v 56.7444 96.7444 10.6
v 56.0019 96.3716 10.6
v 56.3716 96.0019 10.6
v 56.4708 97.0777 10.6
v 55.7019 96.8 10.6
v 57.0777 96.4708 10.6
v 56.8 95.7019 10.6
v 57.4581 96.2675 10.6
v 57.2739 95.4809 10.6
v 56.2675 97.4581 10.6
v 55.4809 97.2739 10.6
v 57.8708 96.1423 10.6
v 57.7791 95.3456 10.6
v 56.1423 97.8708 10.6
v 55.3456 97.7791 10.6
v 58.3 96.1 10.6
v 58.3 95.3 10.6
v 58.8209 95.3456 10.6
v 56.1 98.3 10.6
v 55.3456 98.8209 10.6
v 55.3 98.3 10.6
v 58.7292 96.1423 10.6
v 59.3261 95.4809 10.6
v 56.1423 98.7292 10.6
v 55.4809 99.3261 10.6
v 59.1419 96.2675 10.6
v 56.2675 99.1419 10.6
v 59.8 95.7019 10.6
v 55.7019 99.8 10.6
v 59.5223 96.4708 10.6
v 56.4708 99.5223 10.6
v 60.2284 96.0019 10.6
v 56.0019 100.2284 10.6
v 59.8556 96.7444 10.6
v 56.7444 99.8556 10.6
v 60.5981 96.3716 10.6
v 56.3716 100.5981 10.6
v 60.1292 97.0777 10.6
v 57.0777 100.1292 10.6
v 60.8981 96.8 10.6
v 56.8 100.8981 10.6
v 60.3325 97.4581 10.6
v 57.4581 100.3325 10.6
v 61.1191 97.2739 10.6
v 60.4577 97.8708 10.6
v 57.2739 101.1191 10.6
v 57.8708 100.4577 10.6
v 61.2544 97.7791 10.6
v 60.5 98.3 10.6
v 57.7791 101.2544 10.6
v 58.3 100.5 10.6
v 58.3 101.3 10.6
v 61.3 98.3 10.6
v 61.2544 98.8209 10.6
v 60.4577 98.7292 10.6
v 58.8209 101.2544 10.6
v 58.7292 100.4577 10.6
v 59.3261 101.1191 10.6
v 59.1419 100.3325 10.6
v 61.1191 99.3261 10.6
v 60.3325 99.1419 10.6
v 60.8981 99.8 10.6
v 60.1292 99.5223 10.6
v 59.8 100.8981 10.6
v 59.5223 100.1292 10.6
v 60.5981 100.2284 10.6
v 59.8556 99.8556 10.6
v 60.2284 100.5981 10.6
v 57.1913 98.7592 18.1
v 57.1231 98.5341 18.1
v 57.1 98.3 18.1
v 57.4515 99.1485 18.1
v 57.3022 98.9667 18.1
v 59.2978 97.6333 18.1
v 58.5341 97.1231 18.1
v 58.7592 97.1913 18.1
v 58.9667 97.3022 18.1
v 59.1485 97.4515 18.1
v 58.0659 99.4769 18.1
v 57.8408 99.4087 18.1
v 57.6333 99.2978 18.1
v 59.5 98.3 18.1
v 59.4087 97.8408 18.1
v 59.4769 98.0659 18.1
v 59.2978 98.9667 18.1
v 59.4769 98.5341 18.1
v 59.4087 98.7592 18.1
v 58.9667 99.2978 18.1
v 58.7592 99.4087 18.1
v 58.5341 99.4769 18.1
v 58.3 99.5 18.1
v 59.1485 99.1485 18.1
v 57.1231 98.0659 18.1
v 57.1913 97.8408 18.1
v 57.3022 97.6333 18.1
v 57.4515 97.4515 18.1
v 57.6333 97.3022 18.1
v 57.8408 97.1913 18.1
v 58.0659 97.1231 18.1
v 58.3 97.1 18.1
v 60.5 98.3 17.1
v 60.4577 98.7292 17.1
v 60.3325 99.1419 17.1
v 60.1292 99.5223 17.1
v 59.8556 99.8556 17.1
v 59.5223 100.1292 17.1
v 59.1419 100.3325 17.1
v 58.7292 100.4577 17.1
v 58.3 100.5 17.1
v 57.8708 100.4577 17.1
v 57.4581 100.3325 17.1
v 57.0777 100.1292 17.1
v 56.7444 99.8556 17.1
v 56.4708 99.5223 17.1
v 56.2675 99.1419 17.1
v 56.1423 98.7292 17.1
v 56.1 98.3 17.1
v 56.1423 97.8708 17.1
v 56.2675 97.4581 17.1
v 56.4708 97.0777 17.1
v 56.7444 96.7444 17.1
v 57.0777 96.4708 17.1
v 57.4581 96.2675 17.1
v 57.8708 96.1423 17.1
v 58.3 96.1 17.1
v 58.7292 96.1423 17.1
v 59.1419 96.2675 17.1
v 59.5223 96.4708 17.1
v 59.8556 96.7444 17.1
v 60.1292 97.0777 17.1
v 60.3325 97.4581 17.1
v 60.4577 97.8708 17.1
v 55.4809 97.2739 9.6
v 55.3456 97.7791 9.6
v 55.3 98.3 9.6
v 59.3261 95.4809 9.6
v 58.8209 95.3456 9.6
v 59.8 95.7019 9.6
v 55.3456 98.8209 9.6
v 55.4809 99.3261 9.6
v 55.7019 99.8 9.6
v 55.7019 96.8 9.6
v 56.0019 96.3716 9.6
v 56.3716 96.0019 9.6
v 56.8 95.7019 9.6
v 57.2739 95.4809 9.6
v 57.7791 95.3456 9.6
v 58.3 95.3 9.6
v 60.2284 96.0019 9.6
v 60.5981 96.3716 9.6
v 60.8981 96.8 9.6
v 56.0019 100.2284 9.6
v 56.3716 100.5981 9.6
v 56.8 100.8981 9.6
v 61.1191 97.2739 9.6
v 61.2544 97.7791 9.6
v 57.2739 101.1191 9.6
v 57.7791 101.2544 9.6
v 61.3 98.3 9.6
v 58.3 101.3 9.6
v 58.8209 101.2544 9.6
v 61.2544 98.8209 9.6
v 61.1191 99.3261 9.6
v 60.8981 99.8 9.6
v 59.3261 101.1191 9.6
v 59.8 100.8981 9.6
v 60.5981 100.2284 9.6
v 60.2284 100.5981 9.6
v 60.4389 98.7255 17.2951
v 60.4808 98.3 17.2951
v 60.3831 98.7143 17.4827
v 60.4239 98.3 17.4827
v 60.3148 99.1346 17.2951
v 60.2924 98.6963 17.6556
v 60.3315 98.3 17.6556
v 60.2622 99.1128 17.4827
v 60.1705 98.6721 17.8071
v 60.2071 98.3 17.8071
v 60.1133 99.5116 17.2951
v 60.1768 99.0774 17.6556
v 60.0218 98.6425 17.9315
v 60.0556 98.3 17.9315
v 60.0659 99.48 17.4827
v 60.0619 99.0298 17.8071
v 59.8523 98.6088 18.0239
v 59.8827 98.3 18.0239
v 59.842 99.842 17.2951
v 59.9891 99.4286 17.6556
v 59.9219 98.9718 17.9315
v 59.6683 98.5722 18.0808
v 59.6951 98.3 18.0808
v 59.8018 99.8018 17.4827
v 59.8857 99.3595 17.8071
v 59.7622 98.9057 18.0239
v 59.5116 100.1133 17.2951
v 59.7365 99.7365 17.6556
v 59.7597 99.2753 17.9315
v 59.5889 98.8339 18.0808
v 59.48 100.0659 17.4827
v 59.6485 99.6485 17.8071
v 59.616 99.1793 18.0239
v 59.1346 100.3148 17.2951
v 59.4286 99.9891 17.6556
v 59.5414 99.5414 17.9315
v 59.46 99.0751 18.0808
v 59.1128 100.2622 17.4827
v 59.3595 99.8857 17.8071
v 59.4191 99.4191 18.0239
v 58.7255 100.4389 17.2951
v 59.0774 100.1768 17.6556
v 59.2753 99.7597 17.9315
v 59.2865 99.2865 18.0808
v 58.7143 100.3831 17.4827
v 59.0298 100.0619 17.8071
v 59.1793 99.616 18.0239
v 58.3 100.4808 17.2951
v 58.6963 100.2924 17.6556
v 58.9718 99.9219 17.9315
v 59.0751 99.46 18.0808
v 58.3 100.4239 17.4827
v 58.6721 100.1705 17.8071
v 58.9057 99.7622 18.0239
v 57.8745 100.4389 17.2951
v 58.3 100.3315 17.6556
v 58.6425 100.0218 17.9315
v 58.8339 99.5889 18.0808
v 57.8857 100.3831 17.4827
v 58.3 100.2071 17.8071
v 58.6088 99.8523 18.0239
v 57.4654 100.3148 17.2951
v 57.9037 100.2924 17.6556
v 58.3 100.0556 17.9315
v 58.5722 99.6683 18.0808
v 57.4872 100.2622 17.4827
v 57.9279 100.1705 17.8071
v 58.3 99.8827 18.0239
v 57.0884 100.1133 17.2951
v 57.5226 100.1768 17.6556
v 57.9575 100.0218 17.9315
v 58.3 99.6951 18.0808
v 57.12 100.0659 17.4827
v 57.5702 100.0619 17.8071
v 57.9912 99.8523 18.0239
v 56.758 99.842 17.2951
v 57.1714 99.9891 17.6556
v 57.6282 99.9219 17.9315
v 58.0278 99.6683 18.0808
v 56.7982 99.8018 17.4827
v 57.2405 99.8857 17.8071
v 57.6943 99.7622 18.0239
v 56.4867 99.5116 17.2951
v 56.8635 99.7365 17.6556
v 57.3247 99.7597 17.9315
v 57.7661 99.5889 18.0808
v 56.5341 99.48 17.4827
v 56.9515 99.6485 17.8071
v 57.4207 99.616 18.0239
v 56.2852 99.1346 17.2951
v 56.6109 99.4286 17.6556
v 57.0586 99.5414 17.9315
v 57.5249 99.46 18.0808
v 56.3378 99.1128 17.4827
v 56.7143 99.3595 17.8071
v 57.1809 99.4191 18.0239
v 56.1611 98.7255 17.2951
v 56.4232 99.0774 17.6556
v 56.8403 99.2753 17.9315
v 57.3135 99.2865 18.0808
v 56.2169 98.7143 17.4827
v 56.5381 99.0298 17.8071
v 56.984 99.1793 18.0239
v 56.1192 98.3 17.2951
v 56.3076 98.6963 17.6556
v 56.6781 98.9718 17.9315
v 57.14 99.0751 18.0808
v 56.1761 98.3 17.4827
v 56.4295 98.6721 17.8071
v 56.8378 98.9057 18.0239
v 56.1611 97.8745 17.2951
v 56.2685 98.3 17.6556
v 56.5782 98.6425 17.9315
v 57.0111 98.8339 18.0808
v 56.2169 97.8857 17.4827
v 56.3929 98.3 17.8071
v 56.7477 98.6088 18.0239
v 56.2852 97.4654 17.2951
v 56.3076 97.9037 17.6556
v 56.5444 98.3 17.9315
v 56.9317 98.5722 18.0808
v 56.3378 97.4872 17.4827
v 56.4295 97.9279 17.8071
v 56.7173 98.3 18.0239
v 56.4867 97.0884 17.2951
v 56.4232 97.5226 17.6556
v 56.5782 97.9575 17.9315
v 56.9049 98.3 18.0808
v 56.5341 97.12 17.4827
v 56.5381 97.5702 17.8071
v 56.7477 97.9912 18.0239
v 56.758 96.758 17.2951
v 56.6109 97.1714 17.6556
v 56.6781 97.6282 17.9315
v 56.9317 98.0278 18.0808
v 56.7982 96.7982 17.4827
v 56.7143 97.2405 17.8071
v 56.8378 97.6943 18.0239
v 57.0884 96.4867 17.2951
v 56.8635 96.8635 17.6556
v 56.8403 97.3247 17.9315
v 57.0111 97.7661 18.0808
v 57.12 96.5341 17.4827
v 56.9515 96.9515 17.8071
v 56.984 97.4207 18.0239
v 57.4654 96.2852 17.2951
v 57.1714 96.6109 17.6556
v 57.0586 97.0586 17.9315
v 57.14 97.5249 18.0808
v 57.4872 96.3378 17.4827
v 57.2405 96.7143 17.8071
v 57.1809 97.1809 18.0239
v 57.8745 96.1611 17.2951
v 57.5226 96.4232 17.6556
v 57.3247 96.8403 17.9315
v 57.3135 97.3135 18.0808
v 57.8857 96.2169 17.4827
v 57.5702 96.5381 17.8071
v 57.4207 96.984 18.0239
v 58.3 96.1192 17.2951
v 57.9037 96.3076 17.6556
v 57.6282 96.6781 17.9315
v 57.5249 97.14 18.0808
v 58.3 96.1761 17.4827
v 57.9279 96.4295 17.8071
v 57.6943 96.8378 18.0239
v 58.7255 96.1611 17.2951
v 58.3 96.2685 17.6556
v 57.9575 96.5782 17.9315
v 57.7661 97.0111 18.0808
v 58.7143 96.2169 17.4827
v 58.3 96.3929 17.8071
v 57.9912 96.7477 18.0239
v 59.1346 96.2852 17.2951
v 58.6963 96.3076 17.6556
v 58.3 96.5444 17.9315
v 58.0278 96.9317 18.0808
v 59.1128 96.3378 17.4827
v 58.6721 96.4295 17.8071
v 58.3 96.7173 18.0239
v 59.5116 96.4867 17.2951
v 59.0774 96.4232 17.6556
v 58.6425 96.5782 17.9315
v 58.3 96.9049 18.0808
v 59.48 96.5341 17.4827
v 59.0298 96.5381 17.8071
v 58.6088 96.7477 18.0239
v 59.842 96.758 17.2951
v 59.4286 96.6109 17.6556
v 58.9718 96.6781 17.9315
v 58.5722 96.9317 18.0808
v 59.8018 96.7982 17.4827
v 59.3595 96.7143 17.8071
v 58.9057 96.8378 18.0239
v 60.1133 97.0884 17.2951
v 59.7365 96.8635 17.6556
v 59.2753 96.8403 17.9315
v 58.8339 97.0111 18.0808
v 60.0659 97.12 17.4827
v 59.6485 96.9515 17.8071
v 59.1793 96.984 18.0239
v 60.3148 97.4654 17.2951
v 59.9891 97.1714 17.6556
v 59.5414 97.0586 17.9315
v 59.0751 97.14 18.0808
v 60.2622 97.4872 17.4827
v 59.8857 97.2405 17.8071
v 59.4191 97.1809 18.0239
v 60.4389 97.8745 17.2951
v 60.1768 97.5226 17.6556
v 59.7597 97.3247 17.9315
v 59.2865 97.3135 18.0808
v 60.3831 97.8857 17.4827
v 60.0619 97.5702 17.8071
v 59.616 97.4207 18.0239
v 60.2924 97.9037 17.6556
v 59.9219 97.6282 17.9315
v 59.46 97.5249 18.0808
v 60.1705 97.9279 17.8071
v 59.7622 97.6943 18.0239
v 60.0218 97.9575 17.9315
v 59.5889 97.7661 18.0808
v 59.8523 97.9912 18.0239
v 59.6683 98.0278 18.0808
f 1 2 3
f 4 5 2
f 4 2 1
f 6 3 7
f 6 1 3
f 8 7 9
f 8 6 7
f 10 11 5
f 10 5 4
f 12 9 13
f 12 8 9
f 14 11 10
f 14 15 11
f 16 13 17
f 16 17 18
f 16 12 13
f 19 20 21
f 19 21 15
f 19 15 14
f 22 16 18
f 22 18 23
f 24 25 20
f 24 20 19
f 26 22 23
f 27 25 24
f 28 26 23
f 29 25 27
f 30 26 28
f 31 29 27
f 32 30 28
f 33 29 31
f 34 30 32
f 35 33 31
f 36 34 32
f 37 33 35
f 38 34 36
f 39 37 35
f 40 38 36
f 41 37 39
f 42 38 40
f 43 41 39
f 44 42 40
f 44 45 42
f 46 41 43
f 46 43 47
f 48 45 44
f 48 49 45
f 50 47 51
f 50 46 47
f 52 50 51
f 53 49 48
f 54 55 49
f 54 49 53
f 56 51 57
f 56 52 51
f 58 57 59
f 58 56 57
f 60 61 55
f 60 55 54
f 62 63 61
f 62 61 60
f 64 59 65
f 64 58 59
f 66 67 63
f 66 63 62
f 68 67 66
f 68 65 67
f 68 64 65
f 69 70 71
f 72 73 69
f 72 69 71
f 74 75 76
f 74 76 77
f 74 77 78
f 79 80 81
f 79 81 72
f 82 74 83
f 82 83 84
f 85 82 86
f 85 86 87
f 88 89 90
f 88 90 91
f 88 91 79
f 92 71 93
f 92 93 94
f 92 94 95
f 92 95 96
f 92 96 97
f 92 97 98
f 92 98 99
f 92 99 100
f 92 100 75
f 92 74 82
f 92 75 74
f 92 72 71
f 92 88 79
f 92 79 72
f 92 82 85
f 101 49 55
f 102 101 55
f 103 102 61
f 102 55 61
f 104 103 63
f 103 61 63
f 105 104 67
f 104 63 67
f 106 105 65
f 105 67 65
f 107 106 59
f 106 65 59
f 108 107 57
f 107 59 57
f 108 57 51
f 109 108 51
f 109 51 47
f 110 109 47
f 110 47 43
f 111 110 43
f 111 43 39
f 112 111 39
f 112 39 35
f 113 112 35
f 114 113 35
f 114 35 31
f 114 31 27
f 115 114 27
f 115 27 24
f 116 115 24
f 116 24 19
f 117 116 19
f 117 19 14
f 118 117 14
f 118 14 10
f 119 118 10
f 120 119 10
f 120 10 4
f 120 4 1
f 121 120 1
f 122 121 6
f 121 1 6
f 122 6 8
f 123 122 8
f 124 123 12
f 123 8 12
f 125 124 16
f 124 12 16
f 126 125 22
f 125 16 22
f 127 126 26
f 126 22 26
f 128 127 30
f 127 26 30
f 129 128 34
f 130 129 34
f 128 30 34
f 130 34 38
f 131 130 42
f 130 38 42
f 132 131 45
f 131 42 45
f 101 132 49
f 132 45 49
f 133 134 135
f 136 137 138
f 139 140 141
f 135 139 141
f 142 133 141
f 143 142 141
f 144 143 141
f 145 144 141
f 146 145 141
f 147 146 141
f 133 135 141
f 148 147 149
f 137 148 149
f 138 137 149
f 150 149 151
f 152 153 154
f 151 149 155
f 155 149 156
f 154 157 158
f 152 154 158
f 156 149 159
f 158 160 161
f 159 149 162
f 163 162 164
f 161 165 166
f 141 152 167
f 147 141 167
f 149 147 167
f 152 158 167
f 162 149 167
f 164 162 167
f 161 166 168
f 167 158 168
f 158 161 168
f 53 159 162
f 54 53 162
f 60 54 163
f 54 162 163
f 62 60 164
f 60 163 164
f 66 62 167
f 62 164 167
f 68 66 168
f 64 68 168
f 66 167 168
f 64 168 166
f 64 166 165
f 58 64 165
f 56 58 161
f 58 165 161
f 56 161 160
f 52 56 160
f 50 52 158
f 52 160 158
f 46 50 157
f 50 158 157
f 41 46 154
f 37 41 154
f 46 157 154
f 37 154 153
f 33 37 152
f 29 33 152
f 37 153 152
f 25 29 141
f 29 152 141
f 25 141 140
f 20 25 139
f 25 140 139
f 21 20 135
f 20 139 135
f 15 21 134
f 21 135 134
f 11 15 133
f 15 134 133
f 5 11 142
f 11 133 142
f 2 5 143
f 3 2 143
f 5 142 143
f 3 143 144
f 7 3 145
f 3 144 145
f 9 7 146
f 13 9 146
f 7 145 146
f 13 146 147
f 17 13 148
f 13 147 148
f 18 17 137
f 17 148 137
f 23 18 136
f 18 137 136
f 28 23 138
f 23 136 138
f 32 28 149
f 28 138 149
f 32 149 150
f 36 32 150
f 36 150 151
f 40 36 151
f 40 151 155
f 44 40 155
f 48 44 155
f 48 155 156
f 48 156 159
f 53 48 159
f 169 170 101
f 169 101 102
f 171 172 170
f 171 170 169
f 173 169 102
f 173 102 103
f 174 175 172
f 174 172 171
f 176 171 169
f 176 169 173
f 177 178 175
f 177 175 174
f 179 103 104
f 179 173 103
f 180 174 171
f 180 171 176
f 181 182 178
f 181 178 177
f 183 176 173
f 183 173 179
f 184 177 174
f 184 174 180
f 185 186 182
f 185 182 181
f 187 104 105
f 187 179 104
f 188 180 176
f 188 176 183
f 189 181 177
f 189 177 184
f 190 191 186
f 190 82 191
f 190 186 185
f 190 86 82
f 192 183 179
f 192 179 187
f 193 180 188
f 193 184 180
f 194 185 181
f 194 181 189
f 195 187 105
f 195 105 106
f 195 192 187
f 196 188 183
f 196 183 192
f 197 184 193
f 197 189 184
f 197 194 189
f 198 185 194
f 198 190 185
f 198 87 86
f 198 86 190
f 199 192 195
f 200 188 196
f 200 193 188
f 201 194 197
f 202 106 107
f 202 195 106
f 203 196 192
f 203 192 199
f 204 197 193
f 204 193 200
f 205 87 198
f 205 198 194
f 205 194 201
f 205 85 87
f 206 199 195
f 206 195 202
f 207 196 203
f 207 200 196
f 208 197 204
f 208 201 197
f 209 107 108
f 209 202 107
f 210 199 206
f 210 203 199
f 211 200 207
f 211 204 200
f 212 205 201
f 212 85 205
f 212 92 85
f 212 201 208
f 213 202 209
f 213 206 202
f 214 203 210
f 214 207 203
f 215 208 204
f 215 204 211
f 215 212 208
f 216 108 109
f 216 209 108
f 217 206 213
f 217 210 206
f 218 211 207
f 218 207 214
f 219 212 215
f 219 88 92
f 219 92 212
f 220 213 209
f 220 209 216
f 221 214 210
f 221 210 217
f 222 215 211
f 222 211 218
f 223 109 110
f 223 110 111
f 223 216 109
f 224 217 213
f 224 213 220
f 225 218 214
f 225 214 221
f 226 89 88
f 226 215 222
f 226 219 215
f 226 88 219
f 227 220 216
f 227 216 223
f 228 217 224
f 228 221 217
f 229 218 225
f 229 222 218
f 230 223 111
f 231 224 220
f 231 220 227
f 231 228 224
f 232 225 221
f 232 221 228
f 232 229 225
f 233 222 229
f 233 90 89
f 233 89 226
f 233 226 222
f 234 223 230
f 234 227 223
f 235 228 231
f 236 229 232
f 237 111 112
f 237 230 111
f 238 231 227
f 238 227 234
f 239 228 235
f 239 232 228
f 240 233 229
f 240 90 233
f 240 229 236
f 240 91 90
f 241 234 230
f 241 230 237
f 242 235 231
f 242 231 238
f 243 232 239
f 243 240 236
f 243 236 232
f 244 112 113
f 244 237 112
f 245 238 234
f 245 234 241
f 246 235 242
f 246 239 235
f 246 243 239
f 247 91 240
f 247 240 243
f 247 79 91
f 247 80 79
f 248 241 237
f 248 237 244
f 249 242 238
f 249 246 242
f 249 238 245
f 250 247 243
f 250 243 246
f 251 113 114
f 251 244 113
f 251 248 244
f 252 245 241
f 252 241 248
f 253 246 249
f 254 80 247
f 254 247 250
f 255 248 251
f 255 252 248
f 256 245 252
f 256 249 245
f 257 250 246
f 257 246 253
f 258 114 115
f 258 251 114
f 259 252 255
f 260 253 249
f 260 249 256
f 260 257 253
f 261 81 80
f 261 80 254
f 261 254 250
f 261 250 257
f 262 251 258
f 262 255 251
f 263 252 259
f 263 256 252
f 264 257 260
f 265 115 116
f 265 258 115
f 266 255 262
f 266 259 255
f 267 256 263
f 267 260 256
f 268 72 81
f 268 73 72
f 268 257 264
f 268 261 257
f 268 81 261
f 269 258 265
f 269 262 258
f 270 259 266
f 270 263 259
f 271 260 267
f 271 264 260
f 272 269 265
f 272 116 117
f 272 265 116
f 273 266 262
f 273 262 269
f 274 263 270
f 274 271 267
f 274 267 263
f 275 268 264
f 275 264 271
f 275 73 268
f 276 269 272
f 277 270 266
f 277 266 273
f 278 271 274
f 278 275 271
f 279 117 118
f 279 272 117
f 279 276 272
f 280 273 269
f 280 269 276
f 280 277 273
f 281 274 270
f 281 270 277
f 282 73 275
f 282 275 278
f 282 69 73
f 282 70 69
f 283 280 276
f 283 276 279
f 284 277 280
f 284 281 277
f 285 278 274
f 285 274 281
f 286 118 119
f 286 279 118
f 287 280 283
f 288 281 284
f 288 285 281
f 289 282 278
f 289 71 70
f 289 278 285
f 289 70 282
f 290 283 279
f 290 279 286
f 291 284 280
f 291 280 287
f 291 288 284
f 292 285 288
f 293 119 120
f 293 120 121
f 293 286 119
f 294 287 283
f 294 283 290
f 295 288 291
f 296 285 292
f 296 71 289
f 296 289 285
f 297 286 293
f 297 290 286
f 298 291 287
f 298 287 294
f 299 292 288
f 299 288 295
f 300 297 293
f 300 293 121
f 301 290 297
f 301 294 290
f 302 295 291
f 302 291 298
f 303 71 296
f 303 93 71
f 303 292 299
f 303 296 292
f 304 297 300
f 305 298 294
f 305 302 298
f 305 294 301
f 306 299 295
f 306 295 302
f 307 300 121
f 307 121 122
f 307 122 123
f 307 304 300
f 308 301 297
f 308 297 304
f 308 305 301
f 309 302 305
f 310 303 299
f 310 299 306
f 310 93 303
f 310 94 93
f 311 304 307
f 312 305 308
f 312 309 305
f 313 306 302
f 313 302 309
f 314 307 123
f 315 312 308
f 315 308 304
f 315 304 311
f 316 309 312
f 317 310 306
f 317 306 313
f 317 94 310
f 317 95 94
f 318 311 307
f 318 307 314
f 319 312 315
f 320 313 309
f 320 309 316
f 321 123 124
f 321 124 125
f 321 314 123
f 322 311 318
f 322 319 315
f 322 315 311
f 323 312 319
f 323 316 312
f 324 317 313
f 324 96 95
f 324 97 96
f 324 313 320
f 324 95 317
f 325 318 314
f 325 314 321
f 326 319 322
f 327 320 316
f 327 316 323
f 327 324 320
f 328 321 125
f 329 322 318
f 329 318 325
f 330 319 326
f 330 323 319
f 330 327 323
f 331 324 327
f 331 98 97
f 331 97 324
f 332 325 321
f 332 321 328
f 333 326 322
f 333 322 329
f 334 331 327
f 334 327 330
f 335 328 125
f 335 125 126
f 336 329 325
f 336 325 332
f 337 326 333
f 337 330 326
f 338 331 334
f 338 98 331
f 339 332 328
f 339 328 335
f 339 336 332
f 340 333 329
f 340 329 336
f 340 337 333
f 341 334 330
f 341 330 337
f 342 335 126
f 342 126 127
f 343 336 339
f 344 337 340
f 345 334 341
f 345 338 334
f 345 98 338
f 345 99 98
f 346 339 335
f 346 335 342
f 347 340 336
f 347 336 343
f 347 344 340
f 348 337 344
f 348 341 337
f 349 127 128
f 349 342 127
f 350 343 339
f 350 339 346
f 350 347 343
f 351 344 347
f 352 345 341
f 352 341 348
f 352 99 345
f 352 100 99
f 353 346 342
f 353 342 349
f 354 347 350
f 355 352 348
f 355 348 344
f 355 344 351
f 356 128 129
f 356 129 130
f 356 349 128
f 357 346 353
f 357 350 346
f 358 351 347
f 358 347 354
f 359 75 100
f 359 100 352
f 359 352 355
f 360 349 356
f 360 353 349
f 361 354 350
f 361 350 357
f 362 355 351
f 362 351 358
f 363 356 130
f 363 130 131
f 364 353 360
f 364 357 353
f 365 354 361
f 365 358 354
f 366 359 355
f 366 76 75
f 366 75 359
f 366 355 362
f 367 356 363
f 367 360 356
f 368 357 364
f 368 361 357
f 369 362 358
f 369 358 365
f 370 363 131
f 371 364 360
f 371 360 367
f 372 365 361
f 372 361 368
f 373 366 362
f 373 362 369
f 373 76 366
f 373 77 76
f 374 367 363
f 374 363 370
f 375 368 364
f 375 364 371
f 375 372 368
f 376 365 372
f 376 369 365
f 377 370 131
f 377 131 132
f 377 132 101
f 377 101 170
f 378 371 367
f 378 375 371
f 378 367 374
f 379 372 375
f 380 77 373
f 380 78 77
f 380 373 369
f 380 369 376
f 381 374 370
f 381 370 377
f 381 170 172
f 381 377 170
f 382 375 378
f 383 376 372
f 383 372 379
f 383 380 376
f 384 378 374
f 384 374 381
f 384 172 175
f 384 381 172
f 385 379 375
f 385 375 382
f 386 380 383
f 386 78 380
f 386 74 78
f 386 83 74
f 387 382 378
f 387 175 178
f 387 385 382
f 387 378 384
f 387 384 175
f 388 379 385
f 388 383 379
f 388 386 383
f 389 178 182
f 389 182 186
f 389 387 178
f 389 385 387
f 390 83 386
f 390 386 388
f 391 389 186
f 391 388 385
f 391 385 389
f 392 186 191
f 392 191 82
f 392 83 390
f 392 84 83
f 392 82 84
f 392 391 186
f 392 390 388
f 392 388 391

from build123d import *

# Parameters (mm, degrees)
CYLINDER020_R     = 2.2
CYLINDER020_DEPTH = 8.5
CYLINDER022_R     = 3
CYLINDER022_DEPTH = 1
FILLET001_R       = 1


with BuildPart() as control_button_c:
    # Cylinder020 → Cylinder020 (new body)
    with BuildSketch(Plane(origin=(58.3, 98.3, 9.6), x_dir=(1, 0, 0), z_dir=(0, 0, 1))):
        Circle(CYLINDER020_R)
    extrude(amount=CYLINDER020_DEPTH)


with BuildPart() as control_button:
    # Cylinder022 → Cylinder022 (new body)
    with BuildSketch(Plane(origin=(58.3, 98.3, 9.6), x_dir=(1, 0, 0), z_dir=(0, 0, 1))):
        Circle(CYLINDER022_R)
    extrude(amount=CYLINDER022_DEPTH)

    # Fusion033: union control_button_c
    add(control_button_c.part)

    # Fillet001
    fillet001_edges = [control_button.edges().sort_by_distance(p)[0] for p in [
        (56.1, 98.3, 18.1),
    ]]
    fillet(fillet001_edges, radius=FILLET001_R)


solid = control_button.part
